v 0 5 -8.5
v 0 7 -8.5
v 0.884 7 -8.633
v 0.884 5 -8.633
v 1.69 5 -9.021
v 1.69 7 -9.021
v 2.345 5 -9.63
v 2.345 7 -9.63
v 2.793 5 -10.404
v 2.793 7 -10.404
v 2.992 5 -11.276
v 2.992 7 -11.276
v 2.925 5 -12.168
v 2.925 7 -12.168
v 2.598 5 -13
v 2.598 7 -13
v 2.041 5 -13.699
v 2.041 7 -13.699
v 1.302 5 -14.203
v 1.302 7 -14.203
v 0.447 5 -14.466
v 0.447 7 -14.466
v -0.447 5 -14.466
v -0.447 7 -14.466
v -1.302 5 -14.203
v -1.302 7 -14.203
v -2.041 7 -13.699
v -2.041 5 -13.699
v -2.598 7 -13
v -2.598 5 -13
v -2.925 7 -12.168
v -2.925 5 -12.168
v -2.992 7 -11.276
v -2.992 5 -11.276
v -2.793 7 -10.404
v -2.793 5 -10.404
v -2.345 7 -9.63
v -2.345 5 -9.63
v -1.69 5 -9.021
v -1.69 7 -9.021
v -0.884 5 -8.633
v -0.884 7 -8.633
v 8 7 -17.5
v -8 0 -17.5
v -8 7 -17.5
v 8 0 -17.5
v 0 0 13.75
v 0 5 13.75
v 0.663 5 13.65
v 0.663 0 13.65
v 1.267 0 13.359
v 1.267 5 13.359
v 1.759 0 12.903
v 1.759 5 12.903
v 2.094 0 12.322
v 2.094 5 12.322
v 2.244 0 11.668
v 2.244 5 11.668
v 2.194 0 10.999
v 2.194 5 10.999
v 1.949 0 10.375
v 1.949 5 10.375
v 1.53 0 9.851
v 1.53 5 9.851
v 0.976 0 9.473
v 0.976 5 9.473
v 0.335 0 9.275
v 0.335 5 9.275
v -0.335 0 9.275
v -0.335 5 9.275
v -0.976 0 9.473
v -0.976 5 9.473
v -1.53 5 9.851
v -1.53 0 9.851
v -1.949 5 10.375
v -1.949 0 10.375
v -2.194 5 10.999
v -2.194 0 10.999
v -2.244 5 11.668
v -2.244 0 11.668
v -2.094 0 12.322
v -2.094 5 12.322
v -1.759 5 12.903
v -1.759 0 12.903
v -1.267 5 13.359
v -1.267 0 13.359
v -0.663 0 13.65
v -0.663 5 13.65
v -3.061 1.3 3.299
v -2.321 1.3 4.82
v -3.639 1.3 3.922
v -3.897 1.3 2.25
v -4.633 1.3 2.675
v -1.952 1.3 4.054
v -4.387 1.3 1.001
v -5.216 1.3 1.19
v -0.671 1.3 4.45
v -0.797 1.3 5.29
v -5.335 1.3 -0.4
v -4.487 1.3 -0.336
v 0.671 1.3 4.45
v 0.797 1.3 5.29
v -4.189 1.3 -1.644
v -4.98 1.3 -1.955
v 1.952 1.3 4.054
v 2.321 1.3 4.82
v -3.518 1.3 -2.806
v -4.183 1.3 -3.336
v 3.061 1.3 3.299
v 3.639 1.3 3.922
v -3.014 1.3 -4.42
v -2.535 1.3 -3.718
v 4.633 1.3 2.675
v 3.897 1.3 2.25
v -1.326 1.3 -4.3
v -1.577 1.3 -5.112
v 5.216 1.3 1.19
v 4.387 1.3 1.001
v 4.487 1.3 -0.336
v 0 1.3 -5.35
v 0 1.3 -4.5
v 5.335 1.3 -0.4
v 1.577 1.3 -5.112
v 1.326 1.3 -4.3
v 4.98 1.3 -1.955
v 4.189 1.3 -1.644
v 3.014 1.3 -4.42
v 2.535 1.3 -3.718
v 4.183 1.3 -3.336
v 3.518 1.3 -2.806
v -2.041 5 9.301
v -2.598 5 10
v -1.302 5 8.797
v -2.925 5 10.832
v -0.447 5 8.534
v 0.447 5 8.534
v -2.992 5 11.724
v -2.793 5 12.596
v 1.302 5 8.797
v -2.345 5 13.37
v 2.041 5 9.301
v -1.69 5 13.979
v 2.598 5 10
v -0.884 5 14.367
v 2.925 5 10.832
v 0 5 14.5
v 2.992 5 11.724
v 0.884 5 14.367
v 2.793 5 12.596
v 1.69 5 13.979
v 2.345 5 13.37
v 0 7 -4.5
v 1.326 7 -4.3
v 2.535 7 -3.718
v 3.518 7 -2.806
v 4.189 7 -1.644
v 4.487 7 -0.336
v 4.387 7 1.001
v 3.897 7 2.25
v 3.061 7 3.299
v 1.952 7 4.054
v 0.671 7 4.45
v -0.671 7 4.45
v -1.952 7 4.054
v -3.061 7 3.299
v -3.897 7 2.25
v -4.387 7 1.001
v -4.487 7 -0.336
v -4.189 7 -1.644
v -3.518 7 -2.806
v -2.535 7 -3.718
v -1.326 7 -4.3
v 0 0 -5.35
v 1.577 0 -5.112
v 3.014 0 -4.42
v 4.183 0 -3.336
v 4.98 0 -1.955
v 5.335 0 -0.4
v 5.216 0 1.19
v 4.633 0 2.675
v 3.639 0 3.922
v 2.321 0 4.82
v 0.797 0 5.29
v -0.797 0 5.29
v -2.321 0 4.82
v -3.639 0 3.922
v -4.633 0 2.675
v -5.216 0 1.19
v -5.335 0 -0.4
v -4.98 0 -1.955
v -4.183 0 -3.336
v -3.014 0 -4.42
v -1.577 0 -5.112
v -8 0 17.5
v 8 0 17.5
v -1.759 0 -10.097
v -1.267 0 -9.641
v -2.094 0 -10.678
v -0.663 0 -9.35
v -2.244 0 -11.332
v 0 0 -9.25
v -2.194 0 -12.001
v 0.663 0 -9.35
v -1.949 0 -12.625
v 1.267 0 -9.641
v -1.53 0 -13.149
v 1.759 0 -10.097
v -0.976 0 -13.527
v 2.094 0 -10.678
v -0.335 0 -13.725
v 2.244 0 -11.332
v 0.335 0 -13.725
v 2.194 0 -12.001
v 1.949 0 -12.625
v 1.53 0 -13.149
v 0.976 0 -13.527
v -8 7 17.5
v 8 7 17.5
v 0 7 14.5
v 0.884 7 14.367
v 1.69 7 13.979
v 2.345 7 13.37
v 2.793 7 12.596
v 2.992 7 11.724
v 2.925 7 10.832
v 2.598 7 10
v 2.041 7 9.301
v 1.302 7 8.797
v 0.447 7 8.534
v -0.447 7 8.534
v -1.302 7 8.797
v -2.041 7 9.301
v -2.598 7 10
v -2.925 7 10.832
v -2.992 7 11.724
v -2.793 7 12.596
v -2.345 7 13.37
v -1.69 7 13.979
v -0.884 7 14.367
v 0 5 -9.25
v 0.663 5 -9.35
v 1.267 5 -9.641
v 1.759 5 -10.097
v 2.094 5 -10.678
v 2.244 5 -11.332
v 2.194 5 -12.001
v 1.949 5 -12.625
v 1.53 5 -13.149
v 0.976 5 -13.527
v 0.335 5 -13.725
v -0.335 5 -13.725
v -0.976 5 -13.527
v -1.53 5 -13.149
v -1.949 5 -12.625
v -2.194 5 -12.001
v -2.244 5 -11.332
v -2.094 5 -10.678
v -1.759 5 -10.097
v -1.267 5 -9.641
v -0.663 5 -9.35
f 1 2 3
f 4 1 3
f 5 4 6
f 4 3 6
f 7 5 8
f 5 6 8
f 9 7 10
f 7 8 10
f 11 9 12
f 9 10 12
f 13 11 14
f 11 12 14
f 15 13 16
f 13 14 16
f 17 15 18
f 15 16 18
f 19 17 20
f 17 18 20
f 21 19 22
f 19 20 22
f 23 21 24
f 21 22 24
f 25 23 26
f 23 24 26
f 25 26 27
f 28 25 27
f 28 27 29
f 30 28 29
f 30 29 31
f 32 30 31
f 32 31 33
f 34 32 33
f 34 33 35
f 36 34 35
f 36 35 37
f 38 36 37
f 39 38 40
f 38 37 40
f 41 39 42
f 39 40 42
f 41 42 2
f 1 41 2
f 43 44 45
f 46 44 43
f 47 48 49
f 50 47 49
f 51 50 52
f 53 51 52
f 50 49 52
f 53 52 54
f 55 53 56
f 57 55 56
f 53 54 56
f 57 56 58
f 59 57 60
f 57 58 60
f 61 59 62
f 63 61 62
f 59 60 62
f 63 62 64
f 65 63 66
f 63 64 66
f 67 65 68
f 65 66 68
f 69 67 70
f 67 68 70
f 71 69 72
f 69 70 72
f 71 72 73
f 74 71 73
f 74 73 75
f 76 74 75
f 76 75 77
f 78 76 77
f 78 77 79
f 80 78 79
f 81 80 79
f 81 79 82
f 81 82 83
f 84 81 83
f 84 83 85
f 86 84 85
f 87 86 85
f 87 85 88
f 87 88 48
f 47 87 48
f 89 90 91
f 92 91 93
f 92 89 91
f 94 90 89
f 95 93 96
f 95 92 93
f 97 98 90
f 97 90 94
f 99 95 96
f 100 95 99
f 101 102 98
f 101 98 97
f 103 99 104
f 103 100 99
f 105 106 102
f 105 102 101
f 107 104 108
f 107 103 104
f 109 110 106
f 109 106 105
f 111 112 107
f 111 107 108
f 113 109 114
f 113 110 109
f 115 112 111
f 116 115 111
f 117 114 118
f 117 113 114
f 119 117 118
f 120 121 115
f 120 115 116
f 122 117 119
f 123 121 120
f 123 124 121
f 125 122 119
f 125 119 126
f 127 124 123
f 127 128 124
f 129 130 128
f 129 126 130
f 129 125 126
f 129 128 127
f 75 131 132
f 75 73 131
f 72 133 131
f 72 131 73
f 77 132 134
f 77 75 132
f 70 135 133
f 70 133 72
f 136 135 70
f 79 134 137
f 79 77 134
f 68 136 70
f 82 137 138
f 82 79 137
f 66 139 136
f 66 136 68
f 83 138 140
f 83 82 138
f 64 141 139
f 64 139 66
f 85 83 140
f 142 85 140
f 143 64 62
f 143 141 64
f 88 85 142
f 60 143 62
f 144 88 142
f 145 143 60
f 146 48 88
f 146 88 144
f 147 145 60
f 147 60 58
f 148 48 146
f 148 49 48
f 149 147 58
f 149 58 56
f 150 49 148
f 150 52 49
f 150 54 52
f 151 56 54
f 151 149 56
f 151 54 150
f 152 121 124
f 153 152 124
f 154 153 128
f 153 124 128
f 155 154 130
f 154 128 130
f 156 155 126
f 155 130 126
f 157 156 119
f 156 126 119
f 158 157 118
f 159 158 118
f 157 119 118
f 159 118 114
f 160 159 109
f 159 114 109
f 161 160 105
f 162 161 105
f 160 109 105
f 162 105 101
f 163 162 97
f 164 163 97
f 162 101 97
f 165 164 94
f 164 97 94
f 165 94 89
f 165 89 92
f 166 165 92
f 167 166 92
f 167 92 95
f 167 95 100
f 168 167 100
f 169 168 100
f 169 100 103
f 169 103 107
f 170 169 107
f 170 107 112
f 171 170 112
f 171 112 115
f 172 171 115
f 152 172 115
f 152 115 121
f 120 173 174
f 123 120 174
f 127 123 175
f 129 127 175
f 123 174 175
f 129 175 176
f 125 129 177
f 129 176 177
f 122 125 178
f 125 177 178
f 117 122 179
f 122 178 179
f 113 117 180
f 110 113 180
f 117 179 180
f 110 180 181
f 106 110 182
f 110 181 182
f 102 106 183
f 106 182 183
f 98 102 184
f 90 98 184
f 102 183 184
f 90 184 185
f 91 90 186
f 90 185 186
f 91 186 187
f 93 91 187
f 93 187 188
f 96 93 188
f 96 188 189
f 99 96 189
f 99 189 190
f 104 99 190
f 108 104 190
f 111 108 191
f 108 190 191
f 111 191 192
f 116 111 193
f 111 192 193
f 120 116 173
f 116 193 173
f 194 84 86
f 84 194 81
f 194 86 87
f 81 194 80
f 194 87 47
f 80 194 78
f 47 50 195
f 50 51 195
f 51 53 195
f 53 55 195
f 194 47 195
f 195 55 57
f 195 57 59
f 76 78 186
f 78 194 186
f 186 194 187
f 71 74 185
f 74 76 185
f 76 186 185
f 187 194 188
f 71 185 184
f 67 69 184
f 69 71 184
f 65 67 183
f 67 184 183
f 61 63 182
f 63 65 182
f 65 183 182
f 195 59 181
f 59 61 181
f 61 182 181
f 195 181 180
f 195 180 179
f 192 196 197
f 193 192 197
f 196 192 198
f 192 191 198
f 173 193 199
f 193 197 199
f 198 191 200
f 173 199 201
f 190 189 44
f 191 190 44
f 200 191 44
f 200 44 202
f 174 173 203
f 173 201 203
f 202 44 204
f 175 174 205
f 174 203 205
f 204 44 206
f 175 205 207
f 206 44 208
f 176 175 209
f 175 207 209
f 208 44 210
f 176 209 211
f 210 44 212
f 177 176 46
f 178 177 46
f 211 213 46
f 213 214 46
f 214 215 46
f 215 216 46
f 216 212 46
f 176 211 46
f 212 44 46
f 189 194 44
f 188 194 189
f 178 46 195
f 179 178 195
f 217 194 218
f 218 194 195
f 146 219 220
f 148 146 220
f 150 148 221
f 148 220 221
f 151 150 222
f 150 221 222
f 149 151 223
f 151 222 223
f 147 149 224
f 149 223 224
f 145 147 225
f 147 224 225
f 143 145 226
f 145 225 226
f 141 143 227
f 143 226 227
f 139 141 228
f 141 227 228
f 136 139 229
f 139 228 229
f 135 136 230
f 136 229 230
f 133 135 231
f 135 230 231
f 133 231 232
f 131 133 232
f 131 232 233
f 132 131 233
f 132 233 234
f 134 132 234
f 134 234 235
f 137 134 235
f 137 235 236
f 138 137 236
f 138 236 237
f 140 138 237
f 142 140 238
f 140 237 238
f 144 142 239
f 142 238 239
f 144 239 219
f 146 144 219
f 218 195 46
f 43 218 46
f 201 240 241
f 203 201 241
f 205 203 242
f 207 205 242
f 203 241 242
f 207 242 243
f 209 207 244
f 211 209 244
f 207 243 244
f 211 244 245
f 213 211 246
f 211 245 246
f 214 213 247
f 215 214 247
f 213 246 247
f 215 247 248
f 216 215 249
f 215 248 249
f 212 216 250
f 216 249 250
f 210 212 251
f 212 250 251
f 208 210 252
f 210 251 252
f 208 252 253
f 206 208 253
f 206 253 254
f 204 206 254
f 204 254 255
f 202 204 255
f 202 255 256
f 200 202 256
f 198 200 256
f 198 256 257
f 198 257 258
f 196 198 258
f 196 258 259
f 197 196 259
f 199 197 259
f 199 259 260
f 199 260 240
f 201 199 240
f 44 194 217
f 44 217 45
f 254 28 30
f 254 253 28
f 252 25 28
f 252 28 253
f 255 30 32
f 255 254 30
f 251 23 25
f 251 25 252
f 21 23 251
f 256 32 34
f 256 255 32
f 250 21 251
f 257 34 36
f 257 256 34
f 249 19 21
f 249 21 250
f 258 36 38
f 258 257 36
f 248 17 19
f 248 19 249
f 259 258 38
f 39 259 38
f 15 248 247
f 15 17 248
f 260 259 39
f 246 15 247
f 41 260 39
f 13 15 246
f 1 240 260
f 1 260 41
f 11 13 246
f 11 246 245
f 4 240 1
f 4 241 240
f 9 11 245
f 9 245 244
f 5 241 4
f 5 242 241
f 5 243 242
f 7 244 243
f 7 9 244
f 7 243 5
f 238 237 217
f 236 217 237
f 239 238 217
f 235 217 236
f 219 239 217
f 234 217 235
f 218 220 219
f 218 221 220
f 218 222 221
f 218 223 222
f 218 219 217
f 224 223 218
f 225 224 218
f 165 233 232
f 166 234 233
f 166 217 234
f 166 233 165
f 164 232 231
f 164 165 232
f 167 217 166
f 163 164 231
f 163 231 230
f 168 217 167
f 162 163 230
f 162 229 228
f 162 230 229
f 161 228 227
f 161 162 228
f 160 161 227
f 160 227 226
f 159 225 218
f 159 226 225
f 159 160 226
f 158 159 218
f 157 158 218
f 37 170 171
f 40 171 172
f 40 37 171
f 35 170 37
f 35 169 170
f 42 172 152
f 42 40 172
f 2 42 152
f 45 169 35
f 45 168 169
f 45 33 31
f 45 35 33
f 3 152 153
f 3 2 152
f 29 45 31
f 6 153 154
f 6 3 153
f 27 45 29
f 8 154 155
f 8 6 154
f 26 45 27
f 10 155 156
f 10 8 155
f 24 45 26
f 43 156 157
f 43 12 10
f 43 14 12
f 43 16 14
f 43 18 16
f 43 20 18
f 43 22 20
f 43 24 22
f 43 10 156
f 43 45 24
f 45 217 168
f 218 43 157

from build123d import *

# Parameters (mm, degrees)
SKETCH_1_W          = 16
SKETCH_1_H          = 35
EXTRUDE_1_DEPTH     = 7
SKETCH_2_R          = 5.35
CUT_EXTRUDE_1_DEPTH = 1.3
SKETCH_3_R          = 4.5
CUT_EXTRUDE_2_DEPTH = 21.068383094
SKETCH_4_R          = 3
CUT_EXTRUDE_3_DEPTH = 2
SKETCH_6_R          = 2.25
CUT_EXTRUDE_4_DEPTH = 20.880895352


with BuildPart() as part:
    # 草图1 → 凸台-拉伸1 (new body)
    with BuildSketch(Plane(origin=(0, 0, 0), x_dir=(1, 0, 0), z_dir=(0, 1, 0))):
        Rectangle(SKETCH_1_W, SKETCH_1_H)
    extrude(amount=EXTRUDE_1_DEPTH)

    # 草图2 → 切除-拉伸1 (cut)
    with BuildSketch(Plane.XZ):
        with Locations(Location((0, 0, 0), (0, 0, 270))):
            Circle(SKETCH_2_R)
    extrude(amount=-CUT_EXTRUDE_1_DEPTH, mode=Mode.SUBTRACT)

    # 草图3 → 切除-拉伸2 (cut, through all)
    with BuildSketch(Plane.XZ.offset(-1.3)):
        with Locations(Location((0, 0, 0), (0, 0, 270))):
            Circle(SKETCH_3_R)
    extrude(amount=-CUT_EXTRUDE_2_DEPTH, mode=Mode.SUBTRACT)

    # 草图4 → 切除-拉伸3 (cut)
    with BuildSketch(Plane(origin=(0, 7, 0), x_dir=(1, 0, 0), z_dir=(0, 1, 0))):
        with Locations(Location((0, 11.5, 0), (0, 0, 270))):
            Circle(SKETCH_4_R)
        with Locations(Location((0, -11.5, 0), (0, 0, 270))):
            Circle(SKETCH_4_R)
    extrude(amount=-CUT_EXTRUDE_3_DEPTH, mode=Mode.SUBTRACT)

    # 草图6 → 切除-拉伸4 (cut, through all)
    with BuildSketch(Plane(origin=(0, 5, 0), x_dir=(1, 0, 0), z_dir=(0, 1, 0))):
        with Locations(Location((0, -11.5, 0), (0, 0, 270))):
            Circle(SKETCH_6_R)
        with Locations(Location((0, 11.5, 0), (0, 0, 270))):
            Circle(SKETCH_6_R)
    extrude(amount=-CUT_EXTRUDE_4_DEPTH, mode=Mode.SUBTRACT)


solid = part.part
